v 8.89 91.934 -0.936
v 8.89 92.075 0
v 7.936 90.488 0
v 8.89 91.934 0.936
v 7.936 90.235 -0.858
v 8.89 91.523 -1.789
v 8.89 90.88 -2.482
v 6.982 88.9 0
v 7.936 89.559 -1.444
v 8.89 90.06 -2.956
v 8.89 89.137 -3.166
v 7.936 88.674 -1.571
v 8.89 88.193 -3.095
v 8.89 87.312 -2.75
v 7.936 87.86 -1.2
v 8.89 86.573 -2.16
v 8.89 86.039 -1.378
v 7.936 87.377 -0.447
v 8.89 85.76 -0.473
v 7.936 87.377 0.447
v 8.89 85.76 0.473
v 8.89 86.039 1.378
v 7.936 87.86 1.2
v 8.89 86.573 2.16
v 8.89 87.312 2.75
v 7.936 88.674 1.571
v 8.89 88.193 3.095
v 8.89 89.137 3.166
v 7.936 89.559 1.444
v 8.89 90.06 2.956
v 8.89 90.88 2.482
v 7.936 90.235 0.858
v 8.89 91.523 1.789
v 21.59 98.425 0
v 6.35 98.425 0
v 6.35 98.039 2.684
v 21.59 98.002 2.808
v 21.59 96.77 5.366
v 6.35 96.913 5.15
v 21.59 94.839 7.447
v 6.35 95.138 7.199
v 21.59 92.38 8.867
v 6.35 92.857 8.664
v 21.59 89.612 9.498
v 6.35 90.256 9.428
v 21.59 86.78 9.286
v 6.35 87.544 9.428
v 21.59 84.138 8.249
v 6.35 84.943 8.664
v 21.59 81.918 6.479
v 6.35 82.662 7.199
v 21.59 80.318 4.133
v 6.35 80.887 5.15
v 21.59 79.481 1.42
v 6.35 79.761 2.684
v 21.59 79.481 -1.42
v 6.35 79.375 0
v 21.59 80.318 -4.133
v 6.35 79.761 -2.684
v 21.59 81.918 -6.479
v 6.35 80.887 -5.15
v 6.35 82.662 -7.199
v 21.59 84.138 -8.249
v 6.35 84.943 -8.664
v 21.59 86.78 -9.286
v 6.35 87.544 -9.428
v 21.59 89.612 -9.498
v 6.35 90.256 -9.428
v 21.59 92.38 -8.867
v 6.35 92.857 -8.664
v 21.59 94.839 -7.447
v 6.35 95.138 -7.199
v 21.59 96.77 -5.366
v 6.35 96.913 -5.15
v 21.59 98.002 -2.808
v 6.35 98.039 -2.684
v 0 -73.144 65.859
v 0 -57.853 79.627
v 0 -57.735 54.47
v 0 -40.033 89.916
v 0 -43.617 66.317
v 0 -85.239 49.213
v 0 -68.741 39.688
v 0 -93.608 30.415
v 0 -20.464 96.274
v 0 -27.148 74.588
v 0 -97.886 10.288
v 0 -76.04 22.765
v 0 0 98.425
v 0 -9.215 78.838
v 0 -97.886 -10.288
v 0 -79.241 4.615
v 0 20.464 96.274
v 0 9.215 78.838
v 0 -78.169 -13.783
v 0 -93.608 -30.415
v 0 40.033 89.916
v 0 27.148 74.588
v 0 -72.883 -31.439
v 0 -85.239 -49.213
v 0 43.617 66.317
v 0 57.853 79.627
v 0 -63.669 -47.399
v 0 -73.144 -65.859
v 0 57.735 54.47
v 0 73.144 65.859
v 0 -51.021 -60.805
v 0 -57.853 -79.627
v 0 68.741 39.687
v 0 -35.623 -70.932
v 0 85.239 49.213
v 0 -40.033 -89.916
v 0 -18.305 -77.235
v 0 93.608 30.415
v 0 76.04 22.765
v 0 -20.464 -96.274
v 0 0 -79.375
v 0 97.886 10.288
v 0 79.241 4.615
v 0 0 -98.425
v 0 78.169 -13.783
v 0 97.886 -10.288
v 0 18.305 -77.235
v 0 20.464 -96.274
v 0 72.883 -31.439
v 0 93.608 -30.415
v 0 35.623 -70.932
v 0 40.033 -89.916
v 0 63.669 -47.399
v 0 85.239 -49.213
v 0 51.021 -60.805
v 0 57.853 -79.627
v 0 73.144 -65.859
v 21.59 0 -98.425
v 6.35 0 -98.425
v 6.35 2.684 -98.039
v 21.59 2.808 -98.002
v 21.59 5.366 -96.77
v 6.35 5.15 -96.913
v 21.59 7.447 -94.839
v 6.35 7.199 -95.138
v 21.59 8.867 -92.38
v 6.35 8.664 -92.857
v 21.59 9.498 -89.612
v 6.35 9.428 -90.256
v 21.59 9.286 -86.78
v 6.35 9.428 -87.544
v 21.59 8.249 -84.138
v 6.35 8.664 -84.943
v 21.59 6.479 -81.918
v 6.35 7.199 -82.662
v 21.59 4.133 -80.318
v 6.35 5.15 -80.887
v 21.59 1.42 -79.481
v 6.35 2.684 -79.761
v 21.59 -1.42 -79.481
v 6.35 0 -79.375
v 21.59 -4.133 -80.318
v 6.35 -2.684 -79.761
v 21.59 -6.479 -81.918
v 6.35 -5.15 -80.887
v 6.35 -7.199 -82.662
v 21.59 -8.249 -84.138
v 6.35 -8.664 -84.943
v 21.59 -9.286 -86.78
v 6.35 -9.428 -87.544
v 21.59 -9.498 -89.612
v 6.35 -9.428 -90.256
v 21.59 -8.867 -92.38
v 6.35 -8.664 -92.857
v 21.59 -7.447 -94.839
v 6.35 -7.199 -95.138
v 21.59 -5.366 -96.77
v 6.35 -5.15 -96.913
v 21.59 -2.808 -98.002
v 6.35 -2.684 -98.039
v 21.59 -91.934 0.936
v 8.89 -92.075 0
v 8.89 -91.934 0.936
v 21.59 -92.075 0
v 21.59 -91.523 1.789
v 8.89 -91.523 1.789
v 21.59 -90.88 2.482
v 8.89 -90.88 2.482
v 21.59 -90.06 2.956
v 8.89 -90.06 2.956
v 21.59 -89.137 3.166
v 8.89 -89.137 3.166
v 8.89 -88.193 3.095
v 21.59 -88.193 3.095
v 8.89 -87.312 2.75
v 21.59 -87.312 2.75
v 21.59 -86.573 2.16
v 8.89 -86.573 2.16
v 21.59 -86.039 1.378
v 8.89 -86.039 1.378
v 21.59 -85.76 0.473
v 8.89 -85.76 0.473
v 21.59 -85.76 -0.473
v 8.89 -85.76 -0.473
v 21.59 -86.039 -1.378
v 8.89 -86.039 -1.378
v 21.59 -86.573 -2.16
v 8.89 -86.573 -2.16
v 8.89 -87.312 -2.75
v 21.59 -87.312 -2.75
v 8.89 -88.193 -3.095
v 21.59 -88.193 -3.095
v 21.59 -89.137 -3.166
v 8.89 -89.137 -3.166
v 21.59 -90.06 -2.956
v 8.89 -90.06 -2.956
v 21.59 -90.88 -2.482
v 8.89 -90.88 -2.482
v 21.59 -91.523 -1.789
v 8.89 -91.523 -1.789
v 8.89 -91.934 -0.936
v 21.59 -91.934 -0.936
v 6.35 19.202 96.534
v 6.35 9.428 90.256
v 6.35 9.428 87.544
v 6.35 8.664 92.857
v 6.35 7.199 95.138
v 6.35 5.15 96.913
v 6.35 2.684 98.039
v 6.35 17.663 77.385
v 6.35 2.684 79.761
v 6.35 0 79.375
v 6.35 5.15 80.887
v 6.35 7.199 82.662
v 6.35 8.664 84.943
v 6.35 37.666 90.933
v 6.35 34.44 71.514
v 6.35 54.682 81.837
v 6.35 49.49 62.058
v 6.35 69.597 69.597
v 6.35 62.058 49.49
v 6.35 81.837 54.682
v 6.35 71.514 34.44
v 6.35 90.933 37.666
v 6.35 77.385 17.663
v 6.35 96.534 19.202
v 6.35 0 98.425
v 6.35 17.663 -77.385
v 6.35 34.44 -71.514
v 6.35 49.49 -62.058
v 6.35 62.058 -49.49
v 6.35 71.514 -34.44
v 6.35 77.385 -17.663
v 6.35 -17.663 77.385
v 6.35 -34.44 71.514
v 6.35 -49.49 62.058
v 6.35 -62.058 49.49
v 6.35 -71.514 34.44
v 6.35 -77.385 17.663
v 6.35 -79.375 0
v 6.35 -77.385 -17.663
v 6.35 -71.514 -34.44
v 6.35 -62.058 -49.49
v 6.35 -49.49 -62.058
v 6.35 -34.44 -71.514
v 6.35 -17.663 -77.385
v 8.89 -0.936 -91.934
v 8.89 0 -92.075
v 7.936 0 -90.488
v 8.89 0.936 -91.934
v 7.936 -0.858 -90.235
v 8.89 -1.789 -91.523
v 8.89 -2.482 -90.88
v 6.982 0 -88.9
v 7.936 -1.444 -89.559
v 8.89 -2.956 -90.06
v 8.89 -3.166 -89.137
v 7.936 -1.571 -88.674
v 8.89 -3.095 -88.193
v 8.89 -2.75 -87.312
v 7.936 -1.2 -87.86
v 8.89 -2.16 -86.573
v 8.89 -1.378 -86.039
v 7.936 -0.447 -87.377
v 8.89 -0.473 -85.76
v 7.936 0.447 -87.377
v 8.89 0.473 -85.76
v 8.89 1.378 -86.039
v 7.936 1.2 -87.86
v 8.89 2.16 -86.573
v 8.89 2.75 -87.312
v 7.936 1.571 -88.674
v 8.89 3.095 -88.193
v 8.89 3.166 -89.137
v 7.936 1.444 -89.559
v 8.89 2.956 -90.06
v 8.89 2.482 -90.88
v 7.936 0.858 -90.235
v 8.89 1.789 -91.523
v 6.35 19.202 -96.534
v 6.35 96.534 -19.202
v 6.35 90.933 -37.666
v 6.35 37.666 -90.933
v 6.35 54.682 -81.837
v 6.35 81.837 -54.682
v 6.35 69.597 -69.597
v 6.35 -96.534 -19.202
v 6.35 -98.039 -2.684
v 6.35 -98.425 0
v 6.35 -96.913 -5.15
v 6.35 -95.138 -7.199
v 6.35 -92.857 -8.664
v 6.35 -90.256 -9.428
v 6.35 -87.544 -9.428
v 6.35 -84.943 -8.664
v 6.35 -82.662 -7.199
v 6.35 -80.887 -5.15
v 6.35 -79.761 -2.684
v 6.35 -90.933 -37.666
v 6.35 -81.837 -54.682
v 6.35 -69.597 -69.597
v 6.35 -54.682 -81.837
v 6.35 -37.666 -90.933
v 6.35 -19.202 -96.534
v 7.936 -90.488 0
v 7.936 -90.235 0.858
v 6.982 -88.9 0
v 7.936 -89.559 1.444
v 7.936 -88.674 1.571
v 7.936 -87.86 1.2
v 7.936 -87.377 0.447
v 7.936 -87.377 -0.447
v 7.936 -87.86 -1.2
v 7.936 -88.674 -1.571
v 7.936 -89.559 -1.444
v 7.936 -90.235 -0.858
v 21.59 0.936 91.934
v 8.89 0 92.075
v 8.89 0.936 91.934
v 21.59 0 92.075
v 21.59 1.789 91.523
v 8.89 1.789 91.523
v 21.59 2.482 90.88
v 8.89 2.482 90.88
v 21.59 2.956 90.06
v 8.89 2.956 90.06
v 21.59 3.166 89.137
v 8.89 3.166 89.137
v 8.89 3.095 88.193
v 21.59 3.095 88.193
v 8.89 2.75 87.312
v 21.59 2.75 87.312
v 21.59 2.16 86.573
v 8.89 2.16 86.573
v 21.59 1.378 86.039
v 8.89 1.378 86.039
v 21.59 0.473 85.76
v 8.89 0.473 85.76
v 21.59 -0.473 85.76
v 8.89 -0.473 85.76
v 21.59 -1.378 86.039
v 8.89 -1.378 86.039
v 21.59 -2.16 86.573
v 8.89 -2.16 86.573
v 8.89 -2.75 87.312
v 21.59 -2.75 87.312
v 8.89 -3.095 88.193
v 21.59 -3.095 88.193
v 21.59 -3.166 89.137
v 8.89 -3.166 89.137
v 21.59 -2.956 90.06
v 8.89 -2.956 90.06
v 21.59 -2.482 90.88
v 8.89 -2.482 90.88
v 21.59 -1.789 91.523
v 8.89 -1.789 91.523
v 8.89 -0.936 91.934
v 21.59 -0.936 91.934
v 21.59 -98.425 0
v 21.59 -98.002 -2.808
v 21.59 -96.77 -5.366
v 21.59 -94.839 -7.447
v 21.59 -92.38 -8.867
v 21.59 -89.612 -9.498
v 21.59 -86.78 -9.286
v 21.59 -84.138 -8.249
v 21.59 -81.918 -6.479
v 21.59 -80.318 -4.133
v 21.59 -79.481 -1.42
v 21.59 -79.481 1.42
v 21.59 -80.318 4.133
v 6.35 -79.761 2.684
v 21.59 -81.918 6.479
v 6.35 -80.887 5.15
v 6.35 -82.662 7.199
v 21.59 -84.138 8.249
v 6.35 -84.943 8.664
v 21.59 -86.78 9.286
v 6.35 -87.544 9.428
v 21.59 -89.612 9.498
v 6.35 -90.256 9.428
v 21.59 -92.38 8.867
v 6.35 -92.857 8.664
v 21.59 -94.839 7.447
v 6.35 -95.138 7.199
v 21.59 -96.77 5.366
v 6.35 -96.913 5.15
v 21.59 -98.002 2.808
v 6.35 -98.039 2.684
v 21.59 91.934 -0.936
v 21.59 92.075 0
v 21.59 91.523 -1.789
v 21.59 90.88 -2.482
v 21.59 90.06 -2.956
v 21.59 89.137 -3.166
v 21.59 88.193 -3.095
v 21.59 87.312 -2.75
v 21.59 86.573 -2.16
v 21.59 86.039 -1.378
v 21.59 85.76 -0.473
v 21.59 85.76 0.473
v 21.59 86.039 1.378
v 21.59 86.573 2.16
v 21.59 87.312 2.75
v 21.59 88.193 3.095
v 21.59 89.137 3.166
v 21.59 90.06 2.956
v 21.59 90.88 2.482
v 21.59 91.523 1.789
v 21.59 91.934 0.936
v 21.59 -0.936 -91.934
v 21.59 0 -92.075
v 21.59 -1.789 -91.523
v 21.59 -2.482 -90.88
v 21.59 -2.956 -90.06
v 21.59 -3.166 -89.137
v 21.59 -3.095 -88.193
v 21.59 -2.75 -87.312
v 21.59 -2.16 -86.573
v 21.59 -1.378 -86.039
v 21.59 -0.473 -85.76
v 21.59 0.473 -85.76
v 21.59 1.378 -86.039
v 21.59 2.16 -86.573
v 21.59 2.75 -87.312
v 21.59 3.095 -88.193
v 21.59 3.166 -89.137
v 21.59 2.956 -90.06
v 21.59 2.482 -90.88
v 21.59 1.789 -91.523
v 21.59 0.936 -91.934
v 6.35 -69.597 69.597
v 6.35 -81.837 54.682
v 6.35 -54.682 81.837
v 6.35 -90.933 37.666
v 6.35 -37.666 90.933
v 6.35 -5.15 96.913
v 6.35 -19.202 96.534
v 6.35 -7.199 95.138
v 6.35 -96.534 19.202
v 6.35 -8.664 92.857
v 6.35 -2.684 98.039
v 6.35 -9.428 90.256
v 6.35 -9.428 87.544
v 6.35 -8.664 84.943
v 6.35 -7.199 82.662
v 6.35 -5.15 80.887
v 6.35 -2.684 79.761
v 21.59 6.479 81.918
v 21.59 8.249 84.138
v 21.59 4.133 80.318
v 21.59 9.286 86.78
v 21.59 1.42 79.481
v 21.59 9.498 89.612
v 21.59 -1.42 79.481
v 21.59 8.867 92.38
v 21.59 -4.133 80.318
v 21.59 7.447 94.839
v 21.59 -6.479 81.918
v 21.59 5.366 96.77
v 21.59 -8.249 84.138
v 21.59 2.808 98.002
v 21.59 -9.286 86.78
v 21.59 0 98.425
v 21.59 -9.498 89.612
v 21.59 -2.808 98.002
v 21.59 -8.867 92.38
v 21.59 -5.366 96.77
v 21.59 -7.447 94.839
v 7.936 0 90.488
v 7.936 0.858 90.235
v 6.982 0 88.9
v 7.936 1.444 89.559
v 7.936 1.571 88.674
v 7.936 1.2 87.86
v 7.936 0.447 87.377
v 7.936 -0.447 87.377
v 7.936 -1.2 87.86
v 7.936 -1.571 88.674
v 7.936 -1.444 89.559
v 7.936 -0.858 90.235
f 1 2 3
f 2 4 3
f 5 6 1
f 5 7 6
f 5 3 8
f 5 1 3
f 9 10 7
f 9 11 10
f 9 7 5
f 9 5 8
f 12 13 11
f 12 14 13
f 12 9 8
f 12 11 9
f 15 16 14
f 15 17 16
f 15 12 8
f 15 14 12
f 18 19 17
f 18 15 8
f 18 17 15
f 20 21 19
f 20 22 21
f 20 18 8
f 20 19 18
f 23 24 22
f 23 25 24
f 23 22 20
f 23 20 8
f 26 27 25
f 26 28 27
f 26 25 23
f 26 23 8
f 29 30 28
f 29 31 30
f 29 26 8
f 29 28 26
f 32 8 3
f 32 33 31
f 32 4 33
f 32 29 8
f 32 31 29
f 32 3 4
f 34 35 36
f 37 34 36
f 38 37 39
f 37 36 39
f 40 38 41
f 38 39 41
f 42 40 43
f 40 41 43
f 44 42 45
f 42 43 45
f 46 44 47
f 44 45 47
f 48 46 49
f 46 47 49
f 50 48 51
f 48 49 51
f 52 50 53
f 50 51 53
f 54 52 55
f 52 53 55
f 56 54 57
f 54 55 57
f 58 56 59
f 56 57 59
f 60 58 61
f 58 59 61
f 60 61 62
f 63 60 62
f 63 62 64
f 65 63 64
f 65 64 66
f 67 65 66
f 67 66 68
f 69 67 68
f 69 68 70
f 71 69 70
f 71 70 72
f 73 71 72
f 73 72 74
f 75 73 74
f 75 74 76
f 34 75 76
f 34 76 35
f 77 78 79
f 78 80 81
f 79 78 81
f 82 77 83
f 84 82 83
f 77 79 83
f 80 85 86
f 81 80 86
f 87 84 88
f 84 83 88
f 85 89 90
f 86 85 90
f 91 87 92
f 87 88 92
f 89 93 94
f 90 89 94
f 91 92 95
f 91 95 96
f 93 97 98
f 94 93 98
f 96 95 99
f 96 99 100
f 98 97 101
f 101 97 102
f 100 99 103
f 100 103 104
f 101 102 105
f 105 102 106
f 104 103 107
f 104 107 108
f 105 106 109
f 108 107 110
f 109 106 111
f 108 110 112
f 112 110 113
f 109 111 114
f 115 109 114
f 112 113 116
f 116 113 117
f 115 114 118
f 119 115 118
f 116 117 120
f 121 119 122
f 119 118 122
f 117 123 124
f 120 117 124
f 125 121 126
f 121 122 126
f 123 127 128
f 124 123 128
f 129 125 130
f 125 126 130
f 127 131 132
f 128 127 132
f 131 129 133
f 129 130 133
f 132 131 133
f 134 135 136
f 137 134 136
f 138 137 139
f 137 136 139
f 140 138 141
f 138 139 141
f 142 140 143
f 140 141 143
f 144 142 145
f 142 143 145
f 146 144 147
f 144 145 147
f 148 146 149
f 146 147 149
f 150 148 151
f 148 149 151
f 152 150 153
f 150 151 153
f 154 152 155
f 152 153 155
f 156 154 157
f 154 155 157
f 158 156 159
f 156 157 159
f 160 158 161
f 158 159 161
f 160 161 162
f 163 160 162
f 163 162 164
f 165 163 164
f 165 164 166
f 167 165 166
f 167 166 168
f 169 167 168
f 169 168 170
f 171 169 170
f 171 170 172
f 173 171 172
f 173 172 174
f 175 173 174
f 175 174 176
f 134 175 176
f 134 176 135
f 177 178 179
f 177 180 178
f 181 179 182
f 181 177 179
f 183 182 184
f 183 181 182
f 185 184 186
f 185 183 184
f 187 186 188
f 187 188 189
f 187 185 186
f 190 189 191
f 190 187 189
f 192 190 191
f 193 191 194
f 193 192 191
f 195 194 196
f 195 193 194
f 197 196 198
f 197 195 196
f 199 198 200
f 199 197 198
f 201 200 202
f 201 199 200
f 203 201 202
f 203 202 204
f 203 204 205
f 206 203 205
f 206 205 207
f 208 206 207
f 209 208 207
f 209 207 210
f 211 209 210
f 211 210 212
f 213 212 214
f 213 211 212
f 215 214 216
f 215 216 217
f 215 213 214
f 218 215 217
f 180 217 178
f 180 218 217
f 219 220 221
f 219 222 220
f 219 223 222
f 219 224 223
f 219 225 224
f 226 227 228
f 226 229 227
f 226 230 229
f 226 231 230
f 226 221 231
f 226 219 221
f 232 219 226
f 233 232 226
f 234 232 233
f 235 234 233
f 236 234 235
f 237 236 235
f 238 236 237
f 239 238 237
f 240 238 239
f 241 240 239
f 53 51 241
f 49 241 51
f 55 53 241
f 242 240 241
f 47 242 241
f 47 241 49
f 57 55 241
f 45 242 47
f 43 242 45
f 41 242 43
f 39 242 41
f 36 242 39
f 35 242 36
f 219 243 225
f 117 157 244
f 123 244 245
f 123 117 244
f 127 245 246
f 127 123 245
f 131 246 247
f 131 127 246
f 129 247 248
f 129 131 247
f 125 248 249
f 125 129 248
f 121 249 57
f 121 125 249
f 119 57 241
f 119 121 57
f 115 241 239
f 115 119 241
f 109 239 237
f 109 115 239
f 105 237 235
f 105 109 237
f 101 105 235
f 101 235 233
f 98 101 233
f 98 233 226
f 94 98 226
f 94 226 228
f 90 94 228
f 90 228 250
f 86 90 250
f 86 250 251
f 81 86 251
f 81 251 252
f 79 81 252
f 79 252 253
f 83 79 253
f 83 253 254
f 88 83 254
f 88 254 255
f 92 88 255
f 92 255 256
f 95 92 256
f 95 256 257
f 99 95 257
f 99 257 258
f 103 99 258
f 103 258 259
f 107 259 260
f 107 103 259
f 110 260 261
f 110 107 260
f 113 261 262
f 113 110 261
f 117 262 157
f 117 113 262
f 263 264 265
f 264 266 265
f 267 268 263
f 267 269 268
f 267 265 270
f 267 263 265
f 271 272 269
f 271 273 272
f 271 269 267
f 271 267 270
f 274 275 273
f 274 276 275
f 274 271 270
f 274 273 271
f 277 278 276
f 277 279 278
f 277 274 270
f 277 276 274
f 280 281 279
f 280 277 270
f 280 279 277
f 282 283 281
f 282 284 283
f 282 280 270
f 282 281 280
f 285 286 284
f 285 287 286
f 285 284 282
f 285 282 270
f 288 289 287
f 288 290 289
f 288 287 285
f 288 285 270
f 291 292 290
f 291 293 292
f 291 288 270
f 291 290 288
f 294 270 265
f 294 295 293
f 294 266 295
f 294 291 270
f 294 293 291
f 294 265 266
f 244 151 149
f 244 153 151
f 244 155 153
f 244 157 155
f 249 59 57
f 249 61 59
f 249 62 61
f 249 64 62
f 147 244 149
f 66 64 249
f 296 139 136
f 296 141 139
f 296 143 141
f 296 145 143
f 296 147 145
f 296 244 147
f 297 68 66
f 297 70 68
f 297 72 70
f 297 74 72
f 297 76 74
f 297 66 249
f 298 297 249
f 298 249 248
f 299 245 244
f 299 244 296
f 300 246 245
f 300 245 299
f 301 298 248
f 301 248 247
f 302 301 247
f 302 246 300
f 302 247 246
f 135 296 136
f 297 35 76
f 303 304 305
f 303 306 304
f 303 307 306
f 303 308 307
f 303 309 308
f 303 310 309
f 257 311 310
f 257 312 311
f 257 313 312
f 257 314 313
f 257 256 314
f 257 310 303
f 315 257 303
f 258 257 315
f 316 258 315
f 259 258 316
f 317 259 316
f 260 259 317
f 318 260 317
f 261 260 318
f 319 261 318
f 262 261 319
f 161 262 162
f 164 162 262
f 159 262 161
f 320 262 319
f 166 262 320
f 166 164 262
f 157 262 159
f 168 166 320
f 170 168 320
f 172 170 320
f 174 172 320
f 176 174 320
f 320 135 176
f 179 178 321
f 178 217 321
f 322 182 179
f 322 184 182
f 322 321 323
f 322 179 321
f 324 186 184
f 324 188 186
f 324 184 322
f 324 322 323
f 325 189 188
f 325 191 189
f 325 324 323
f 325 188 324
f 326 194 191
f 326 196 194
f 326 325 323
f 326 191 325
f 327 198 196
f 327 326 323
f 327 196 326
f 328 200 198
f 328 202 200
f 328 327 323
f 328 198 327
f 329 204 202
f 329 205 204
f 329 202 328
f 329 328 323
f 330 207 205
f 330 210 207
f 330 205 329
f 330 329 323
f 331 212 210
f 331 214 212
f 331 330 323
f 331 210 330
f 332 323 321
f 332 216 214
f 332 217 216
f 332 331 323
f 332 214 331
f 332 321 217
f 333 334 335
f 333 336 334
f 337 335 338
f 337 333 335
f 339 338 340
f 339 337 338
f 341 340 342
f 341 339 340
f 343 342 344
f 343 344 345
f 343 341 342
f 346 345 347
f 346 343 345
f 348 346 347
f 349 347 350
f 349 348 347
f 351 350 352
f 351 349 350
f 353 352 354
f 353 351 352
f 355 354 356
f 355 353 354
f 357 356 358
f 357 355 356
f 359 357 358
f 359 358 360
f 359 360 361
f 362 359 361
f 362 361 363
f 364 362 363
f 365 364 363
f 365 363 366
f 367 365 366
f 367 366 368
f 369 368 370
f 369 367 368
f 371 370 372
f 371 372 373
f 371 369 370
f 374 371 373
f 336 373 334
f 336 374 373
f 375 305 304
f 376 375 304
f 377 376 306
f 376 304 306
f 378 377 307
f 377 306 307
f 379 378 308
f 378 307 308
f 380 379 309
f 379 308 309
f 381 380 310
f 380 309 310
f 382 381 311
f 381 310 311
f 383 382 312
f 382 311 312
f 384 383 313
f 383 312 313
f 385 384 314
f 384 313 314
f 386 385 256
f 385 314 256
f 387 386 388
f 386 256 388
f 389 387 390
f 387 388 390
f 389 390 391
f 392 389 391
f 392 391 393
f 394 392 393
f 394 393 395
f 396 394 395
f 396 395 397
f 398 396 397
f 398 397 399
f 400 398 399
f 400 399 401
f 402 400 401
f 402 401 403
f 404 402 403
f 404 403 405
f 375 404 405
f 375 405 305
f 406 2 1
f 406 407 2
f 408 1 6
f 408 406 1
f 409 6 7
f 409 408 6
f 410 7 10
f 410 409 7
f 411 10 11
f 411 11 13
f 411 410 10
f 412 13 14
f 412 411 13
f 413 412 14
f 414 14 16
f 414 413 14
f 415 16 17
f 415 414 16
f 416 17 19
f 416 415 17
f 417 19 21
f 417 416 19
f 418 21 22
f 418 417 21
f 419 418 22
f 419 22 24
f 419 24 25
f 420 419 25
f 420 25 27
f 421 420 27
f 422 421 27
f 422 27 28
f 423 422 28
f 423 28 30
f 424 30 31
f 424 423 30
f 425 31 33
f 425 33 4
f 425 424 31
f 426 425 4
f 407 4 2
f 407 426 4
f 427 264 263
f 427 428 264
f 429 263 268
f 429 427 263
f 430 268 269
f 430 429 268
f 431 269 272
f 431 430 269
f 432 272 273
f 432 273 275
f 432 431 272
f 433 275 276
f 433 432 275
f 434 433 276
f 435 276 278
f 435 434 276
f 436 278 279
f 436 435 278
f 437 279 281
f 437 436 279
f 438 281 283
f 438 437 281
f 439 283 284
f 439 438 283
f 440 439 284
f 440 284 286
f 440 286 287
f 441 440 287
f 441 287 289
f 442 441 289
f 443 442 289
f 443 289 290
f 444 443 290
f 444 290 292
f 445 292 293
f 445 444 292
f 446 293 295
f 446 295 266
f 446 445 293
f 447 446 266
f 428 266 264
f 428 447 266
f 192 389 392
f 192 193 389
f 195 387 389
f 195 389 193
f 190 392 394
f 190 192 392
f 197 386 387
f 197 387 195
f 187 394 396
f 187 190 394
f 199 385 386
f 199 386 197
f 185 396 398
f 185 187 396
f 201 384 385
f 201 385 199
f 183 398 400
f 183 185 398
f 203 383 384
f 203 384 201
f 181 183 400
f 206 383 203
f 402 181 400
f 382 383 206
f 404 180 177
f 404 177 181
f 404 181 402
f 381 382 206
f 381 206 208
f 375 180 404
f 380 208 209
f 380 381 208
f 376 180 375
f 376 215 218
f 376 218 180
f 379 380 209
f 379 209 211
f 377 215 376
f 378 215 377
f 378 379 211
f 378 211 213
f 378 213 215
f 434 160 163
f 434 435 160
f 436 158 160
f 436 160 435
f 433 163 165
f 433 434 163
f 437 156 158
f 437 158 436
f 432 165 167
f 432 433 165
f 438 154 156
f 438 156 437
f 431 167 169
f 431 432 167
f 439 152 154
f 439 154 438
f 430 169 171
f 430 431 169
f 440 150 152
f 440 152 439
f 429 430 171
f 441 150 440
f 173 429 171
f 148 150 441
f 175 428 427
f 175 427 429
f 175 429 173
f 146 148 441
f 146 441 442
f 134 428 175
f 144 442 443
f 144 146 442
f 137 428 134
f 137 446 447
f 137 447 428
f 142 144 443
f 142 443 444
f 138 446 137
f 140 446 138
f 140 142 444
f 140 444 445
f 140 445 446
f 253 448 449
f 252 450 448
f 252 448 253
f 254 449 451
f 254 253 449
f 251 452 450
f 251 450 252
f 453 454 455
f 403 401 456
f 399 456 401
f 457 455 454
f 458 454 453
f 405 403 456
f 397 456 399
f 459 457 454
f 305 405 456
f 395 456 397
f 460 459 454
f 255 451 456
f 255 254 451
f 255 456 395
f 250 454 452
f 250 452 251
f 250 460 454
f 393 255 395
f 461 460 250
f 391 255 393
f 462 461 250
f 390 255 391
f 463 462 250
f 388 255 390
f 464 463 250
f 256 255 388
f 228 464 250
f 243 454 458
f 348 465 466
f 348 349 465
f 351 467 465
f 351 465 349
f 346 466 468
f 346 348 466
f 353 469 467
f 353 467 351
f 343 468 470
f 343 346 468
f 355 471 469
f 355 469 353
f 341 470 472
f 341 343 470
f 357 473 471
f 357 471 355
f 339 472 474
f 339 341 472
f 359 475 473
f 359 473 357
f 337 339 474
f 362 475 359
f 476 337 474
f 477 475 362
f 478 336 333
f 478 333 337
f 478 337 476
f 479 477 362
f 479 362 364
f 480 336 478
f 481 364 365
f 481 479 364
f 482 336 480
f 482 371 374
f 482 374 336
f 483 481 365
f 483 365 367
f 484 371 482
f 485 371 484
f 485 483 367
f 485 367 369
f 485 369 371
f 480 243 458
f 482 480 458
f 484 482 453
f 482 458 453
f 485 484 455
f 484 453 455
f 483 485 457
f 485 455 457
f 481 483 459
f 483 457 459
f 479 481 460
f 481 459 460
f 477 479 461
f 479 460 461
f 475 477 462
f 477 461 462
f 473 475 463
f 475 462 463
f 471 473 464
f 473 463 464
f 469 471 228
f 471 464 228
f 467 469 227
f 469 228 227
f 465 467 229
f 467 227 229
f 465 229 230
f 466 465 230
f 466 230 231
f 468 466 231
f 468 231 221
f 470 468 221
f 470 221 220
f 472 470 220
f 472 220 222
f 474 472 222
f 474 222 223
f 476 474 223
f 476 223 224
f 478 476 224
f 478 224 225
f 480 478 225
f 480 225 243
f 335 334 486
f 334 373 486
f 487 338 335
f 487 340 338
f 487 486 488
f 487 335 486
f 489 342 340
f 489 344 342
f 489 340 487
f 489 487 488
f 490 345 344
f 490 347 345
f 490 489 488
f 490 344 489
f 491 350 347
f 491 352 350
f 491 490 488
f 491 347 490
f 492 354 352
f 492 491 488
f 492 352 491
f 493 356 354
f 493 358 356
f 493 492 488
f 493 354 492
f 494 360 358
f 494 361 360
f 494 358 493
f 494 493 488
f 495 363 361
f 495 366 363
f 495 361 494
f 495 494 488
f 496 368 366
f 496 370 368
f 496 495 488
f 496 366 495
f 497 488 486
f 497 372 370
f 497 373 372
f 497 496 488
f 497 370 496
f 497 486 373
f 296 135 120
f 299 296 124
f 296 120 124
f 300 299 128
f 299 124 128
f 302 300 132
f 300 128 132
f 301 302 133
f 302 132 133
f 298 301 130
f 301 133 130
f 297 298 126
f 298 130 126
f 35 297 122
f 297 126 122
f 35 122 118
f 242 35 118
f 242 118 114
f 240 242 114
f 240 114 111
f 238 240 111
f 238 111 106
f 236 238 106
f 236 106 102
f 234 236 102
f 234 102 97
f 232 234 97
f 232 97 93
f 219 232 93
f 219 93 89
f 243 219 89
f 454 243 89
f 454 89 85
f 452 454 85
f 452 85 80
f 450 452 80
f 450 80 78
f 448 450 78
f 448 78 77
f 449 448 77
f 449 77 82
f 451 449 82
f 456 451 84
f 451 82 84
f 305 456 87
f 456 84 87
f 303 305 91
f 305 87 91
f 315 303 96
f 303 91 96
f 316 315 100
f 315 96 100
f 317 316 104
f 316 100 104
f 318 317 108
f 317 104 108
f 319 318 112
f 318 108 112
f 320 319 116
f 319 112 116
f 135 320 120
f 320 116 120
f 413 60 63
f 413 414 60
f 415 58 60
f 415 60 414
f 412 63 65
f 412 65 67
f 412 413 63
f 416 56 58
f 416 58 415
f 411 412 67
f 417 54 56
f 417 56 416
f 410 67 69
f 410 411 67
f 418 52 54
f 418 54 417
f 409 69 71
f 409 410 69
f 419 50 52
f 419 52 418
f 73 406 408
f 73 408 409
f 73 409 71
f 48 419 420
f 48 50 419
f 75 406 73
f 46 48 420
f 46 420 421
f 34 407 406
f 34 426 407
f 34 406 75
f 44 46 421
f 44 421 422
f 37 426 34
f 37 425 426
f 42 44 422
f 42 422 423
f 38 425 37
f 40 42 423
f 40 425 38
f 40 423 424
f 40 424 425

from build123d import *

# Parameters (mm, degrees)
SKETCH1_R           = 98.425
SKETCH1_R_2         = 79.375
BOSS_EXTRUDE1_DEPTH = 6.35
BOSS_EXTRUDE2_START = 6.35
SKETCH2_R           = 9.525
BOSS_EXTRUDE2_DEPTH = 15.24
CIRPATTERN2_COUNT   = 4


with BuildPart() as part:
    # Sketch1 → Boss-Extrude1 (new body)
    with BuildSketch(Plane(origin=(0, 0, 0), x_dir=(0, 0, -1), z_dir=(1, 0, 0))):
        Circle(SKETCH1_R)
        Circle(SKETCH1_R_2, mode=Mode.SUBTRACT)
    extrude(amount=BOSS_EXTRUDE1_DEPTH)

    # Sketch2 → Boss-Extrude2 (add)
    with BuildSketch(Plane(origin=(0, 0, 0), x_dir=(0, 0, -1), z_dir=(1, 0, 0)).offset(BOSS_EXTRUDE2_START)):
        with Locations((88.9, 0)):
            Circle(SKETCH2_R)
    boss_extrude2 = extrude(amount=BOSS_EXTRUDE2_DEPTH)

    # Sketch4 → 1/4 (0.2500) Dowel Hole1 (revolve, cut)
    with BuildSketch(Plane(origin=(21.59, 0, -88.9), x_dir=(0, 0, -1), z_dir=(0, 1, 0))):
        Polygon((0, 0), (0, 14.607732465), (3.175, 12.7), (3.175, 0), align=None)
    f_1_4_0_2500_dowel_hole1 = revolve(axis=Axis((27.94, 0, -88.9), (-1, 0, 0)), mode=Mode.SUBTRACT)

    # CirPattern2: Boss-Extrude2, 1/4 (0.2500) Dowel Hole1 ×4 about axis
    cirpattern2_axis = Axis((0, 0, 0), (1, 0, 0))
    for i in range(1, CIRPATTERN2_COUNT):
        add(boss_extrude2.rotate(cirpattern2_axis, i * 360 / CIRPATTERN2_COUNT))
        add(f_1_4_0_2500_dowel_hole1.rotate(cirpattern2_axis, i * 360 / CIRPATTERN2_COUNT), mode=Mode.SUBTRACT)


solid = part.part
